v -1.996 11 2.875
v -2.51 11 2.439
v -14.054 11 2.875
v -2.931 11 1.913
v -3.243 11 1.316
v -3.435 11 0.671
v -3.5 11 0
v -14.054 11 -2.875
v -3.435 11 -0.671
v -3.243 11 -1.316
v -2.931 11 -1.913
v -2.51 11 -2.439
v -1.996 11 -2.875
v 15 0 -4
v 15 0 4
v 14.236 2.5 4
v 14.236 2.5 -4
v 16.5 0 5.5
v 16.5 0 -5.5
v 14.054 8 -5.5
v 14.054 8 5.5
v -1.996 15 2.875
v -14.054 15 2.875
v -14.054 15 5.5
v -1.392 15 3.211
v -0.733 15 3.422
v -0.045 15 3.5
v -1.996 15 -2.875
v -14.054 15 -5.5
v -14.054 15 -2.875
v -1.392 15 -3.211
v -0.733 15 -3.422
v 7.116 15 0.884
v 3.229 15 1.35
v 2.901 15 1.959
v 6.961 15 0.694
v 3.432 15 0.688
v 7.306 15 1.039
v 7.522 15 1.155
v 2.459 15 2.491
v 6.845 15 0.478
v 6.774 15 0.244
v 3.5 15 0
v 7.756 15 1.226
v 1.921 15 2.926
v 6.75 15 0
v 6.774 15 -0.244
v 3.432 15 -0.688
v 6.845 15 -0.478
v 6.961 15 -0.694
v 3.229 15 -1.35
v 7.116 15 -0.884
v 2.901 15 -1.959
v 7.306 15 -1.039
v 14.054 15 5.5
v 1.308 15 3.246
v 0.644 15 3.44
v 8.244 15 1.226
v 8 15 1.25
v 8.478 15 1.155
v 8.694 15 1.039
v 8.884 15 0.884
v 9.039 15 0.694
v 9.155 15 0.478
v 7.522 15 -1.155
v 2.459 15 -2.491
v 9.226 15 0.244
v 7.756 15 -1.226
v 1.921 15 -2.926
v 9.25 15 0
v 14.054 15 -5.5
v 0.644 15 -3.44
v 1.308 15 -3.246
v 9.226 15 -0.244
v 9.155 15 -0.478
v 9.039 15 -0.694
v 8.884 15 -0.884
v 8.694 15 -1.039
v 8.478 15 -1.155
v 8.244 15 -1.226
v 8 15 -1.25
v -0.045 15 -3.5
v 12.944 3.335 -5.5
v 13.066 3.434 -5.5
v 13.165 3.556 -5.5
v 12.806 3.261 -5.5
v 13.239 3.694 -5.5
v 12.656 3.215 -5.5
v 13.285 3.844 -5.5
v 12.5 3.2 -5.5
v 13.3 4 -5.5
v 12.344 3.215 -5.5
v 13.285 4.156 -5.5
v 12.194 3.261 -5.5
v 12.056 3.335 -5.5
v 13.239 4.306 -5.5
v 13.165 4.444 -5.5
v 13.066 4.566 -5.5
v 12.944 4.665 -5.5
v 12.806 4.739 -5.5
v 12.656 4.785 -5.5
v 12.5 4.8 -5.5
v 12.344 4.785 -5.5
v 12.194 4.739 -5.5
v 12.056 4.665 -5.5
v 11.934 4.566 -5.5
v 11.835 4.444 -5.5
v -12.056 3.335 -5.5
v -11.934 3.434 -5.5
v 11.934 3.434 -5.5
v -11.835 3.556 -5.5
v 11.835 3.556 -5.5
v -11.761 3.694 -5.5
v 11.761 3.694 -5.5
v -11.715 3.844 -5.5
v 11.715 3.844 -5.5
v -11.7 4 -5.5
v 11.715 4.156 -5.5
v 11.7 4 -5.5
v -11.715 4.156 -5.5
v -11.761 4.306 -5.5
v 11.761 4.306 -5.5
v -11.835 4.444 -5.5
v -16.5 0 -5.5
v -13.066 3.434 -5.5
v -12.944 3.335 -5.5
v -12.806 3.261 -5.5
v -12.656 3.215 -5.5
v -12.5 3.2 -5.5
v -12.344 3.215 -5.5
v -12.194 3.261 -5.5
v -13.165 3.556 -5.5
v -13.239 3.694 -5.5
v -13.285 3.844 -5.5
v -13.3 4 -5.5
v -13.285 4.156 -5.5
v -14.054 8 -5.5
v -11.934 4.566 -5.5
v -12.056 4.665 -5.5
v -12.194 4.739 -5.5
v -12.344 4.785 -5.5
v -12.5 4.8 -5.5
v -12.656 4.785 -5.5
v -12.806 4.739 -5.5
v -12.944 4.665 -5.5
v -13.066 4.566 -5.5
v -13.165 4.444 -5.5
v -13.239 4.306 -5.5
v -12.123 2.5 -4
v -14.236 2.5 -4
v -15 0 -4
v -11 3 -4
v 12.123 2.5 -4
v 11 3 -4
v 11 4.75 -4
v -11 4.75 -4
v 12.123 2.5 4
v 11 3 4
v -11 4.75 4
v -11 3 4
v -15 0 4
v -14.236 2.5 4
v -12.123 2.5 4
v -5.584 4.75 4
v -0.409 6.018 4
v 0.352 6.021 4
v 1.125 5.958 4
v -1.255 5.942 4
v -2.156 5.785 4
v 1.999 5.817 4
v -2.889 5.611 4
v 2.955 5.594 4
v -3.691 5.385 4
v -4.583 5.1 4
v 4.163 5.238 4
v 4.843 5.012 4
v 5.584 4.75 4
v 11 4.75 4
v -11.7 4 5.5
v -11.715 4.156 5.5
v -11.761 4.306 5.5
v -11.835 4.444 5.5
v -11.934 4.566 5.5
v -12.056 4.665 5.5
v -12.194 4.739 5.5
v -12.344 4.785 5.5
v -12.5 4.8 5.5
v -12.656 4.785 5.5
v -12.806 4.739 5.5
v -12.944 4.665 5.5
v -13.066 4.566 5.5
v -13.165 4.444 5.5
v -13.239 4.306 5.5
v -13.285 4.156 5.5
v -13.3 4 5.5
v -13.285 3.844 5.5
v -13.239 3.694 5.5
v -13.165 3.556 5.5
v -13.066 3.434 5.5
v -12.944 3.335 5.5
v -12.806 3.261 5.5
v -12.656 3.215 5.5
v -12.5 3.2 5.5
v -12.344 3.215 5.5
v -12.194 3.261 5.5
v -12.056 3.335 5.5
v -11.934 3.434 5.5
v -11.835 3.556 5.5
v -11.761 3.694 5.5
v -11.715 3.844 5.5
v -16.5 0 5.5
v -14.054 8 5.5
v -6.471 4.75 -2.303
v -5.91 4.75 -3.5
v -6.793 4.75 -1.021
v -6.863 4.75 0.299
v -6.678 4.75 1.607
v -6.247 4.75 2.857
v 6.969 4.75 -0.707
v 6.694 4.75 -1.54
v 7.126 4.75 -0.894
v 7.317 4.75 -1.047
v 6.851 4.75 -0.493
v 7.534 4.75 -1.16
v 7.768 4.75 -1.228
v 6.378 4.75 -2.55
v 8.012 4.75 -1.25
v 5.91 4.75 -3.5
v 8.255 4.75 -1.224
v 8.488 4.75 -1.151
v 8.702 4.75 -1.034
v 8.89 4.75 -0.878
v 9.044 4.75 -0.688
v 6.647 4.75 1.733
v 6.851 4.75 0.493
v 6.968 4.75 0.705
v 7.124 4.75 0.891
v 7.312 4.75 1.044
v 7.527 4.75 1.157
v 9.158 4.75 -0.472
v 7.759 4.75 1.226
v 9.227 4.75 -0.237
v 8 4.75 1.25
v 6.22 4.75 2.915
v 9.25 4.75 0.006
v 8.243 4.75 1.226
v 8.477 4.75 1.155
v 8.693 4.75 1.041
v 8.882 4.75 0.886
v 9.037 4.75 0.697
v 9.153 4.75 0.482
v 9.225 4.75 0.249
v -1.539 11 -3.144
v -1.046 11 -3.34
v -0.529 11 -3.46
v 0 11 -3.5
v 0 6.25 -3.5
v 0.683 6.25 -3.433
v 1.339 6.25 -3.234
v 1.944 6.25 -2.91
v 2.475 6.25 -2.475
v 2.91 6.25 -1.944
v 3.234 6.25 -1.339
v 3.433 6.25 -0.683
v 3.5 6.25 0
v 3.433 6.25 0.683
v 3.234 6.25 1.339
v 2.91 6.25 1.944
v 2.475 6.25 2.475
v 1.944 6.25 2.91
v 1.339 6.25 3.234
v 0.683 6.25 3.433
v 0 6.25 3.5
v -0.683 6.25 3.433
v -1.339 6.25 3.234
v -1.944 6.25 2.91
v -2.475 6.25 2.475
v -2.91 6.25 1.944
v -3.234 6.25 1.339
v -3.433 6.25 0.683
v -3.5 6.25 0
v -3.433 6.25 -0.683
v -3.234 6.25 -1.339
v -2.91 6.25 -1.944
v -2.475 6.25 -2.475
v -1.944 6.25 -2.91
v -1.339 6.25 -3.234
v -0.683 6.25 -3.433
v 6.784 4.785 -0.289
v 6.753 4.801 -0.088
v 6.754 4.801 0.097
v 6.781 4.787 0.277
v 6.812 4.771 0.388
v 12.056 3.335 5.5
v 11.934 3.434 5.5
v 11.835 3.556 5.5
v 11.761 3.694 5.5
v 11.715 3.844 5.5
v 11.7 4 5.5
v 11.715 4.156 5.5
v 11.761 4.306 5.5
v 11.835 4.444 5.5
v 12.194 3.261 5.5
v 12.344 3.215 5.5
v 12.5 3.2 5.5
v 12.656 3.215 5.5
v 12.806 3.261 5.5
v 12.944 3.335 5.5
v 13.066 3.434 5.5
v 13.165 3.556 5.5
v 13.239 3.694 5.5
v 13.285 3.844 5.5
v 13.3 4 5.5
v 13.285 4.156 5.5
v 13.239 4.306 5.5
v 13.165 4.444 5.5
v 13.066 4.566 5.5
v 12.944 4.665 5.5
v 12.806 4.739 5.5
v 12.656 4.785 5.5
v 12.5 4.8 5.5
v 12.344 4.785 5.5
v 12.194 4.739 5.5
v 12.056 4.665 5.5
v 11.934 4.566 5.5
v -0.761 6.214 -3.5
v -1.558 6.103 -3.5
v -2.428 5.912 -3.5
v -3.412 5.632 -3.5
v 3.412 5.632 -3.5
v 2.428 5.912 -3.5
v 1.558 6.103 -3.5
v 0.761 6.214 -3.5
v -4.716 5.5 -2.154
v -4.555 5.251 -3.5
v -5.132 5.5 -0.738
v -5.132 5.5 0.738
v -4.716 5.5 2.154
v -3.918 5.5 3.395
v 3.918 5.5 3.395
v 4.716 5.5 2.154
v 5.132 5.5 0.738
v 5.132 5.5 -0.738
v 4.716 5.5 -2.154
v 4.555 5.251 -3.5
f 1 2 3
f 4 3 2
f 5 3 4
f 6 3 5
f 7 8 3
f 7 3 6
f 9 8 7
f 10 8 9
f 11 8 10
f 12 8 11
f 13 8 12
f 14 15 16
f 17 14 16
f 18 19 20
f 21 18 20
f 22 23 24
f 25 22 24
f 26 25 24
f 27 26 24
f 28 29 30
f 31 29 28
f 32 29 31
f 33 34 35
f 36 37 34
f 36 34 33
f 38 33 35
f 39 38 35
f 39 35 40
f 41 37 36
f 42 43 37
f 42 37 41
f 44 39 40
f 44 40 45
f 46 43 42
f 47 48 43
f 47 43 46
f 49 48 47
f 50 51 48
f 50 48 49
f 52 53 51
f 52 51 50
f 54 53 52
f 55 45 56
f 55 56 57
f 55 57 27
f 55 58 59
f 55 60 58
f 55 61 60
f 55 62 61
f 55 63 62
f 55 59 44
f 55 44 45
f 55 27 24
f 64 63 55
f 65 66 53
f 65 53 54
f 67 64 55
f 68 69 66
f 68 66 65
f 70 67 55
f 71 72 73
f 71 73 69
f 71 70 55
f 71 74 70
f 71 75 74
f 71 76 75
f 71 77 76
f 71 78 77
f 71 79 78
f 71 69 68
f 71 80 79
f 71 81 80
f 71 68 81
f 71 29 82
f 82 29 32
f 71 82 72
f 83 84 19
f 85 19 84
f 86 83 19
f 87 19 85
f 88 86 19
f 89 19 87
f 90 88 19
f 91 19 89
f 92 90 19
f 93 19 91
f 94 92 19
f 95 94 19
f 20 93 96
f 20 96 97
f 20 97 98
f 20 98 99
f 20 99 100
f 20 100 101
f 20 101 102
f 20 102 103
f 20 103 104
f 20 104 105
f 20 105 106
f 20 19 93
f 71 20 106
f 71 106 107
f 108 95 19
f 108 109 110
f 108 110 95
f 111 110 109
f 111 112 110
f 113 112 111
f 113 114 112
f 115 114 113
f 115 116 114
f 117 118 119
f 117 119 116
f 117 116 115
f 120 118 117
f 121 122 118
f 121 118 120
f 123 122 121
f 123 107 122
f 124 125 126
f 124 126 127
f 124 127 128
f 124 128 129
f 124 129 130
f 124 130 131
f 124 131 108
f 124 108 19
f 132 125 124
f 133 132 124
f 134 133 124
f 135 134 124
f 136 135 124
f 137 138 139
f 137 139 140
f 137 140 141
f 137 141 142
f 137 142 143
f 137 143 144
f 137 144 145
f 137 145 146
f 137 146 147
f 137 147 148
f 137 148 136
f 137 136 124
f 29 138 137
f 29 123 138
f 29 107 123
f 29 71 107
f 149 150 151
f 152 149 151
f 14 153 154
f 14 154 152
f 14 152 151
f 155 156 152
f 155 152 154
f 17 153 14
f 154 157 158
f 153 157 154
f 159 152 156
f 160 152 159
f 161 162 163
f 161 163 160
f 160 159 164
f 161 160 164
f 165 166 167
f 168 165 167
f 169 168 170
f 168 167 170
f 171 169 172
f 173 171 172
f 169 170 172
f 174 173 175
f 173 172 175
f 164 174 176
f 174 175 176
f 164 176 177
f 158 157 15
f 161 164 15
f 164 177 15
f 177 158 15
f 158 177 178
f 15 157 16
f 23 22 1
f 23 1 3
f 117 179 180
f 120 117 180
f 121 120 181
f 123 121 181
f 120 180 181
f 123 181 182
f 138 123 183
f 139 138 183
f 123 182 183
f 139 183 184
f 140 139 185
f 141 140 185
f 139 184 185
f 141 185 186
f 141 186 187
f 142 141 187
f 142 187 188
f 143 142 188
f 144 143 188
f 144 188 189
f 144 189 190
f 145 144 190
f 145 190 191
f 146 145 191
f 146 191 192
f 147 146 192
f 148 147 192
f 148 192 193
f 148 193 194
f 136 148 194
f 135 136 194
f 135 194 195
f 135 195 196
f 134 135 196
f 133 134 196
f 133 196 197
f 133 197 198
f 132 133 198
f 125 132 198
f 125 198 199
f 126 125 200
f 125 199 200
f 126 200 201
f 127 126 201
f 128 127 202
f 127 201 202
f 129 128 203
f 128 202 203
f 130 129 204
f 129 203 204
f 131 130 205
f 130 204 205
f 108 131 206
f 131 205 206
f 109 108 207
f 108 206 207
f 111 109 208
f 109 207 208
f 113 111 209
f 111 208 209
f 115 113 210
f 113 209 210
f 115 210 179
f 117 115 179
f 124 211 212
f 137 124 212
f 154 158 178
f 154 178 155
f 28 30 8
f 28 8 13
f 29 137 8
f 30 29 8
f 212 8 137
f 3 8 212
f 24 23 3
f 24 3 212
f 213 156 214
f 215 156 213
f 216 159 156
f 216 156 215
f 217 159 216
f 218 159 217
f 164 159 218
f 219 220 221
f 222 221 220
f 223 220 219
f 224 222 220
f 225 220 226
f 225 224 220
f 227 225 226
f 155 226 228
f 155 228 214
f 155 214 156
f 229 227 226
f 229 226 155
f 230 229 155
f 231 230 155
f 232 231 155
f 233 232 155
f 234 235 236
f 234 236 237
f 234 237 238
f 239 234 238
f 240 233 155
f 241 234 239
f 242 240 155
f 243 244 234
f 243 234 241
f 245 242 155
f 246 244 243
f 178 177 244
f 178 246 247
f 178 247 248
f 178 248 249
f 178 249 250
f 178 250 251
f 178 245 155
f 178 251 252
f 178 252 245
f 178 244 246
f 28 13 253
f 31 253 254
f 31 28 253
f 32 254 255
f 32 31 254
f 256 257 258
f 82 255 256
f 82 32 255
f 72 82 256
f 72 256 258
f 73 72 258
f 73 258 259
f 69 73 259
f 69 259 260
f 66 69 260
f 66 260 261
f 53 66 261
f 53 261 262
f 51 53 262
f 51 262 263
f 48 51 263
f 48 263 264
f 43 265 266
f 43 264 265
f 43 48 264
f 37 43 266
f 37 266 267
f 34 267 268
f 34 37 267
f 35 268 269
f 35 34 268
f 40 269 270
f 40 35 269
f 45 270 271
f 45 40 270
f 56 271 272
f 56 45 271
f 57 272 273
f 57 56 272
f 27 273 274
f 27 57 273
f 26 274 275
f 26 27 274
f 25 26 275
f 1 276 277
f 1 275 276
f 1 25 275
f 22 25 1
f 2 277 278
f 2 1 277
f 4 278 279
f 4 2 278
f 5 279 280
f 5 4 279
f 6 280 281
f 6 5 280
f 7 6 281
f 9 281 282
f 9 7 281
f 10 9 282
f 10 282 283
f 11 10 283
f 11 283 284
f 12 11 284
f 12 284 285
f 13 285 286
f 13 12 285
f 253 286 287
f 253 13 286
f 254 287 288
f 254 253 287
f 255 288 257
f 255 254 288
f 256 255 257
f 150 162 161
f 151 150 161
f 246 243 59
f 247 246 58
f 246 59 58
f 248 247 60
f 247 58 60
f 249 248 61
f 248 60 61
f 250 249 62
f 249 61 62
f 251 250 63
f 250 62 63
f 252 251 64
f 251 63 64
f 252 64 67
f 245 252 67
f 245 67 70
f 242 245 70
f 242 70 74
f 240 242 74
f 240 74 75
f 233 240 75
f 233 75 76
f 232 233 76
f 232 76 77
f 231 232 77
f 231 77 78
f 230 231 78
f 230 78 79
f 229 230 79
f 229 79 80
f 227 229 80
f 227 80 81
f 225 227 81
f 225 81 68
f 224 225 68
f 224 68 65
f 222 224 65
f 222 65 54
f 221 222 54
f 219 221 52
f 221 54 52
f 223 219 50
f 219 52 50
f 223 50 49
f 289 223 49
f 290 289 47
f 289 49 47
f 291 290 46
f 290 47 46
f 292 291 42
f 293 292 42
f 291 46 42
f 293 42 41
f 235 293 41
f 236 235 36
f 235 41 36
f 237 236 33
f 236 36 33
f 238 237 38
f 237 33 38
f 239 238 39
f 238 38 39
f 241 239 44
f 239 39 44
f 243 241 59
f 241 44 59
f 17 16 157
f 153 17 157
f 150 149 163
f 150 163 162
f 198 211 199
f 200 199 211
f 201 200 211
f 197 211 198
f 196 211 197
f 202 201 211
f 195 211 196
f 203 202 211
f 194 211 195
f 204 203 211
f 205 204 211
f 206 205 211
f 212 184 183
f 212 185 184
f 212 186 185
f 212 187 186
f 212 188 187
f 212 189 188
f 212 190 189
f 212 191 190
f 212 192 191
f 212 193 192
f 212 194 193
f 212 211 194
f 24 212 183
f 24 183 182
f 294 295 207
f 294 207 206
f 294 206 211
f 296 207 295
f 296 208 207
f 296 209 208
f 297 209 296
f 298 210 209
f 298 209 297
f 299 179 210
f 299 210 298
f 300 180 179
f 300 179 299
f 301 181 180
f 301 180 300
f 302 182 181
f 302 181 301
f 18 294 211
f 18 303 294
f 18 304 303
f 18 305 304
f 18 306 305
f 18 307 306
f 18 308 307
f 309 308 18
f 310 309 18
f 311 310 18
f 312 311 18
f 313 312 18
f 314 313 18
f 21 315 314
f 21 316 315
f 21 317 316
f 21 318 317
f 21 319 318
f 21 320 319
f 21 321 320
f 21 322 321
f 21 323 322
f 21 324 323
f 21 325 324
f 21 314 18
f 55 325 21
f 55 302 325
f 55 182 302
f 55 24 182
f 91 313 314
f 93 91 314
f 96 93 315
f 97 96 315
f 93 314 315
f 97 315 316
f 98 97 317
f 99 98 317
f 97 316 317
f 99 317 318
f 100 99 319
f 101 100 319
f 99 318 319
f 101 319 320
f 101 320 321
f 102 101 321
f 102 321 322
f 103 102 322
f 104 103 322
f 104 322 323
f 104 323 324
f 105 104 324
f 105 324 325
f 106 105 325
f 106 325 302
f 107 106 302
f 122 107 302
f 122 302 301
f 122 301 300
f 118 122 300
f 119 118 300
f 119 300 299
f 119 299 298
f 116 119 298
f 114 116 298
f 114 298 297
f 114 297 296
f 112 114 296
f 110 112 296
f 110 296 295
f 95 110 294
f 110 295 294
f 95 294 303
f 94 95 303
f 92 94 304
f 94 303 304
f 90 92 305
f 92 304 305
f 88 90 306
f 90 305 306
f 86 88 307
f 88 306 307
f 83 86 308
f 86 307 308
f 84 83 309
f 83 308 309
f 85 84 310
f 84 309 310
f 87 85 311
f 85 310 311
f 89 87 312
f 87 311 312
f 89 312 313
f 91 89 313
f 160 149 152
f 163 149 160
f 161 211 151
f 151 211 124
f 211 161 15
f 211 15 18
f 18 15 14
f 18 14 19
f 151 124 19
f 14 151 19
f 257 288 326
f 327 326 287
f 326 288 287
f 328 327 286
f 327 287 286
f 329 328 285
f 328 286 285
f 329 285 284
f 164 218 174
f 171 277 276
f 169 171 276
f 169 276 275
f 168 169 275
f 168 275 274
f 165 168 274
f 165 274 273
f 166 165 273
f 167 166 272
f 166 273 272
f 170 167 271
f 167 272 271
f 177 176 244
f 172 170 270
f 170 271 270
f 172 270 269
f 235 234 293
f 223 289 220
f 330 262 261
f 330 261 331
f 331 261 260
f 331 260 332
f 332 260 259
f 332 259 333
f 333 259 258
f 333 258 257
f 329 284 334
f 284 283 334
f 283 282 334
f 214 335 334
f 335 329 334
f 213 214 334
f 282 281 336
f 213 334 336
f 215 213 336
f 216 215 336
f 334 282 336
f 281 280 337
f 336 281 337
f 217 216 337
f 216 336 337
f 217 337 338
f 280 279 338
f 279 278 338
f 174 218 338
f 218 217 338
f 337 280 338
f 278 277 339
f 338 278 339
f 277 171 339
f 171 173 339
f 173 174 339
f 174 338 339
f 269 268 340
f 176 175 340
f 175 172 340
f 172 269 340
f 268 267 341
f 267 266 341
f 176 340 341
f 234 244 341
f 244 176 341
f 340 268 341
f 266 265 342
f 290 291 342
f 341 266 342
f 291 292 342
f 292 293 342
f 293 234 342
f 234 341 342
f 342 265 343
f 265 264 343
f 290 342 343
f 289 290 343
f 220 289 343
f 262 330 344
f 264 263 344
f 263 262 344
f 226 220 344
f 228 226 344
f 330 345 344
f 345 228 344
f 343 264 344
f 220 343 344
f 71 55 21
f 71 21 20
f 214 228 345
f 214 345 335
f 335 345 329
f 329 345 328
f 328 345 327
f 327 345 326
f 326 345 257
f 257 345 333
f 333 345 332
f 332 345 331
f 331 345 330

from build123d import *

# Parameters (mm, degrees)
SKETCH1_W                      = 33
SKETCH1_H                      = 11
SKETCH1_W_2                    = 30.000000000000036
SKETCH1_H_2                    = 7.99999999999994
BOSS_EXTRUDE1_DEPTH            = 8
SKETCH3_R                      = 0.8000000000000009
CUT_EXTRUDE3_DEPTH             = 22.383404780343106
CUT_EXTRUDE5_REACH             = 21.144
SKETCH5_R                      = 3.5
CUT_EXTRUDE5_DIRECTION_2_DEPTH = 20.144189719076667
CUT_EXTRUDE4_DEPTH             = 22.383404780343106
CUT_EXTRUDE9_START             = -1.5
CUT_EXTRUDE9_DEPTH             = 8
CUT_EXTRUDE8_DEPTH             = 2.25
BOSS_EXTRUDE8_START            = 3
SKETCH12_W                     = 28.108309096661426
SKETCH12_H                     = 11
SKETCH12_R                     = 3.5
BOSS_EXTRUDE8_DEPTH            = 3
CHAMFER1_SIZE                  = 3.369055161
CHAMFER1_SIZE_2                = 1.5
CHAMFER2_SIZE                  = 0.5
CHAMFER2_SIZE2                 = 1.1230183869521158
CHAMFER3_SIZE                  = 0.5
CHAMFER3_SIZE2                 = 1.1230183869521158
BOSS_EXTRUDE9_REACH            = 20.481
BOSS_EXTRUDE10_START           = 4
BOSS_EXTRUDE10_DEPTH           = 4
CUT_EXTRUDE10_REACH            = 24.967
SKETCH20_R                     = 1.2499999999999991


with BuildPart() as part:
    # Sketch1 → Boss-Extrude1 (new body)
    # profile 1 of 2: a face of its own
    with BuildSketch(Plane(origin=(0, 0, 0), x_dir=(1, 0, 0), z_dir=(0, 1, 0))):
        Rectangle(SKETCH1_W, SKETCH1_H)
        Rectangle(SKETCH1_W_2, SKETCH1_H_2, mode=Mode.SUBTRACT)
    # profile 2 of 2: a face of its own
    with BuildSketch(Plane(origin=(0, 0, 0), x_dir=(1, 0, 0), z_dir=(0, 1, 0))):
        Rectangle(SKETCH1_W_2, SKETCH1_H_2)
    extrude(amount=BOSS_EXTRUDE1_DEPTH)

    # Sketch3 → Cut-Extrude3 (cut, through all)
    with BuildSketch(Plane.XY.offset(5.50000000000003)):
        with Locations((-12.500000000000014, 4)):
            Circle(SKETCH3_R)
        with Locations((12.499999999999988, 4)):
            Circle(SKETCH3_R)
    extrude(amount=-CUT_EXTRUDE3_DEPTH, mode=Mode.SUBTRACT)

    # Sketch5 → Cut-Extrude5 (cut, up to next)
    with BuildSketch(Plane(origin=(0, 8, 0), x_dir=(1, 0, 0), z_dir=(0, 1, 0)), mode=Mode.PRIVATE) as cut_extrude5_sk1:
        with Locations(Location((0, 0, 0), (0, 0, 90))):
            Circle(SKETCH5_R)
    cut_extrude5_tool1 = extrude(cut_extrude5_sk1.sketch, amount=-CUT_EXTRUDE5_REACH, mode=Mode.PRIVATE) & part.part
    add(cut_extrude5_tool1.solids().sort_by_distance((0, 8, 0))[0], mode=Mode.SUBTRACT)

    # Sketch5 → Cut-Extrude5 direction 2 (cut)
    with BuildSketch(Plane(origin=(0, 8, 0), x_dir=(1, 0, 0), z_dir=(0, 1, 0))):
        with Locations(Location((0, 0, 0), (0, 0, 90))):
            Circle(SKETCH5_R)
    extrude(amount=CUT_EXTRUDE5_DIRECTION_2_DEPTH, mode=Mode.SUBTRACT)

    # Sketch4 → Cut-Extrude4 (cut, through all)
    with BuildSketch(Plane.XY.offset(5.50000000000003)):
        Polygon((-16.500000000000014, 0), (-14.054154548330727, 8), (-16.500000000000014, 8), align=None)
        Polygon((16.499999999999986, 0), (14.0541545483307, 8), (16.499999999999986, 8), align=None)
    extrude(amount=-CUT_EXTRUDE4_DEPTH, mode=Mode.SUBTRACT)

    # Sketch14 → Cut-Extrude9 (cut)
    with BuildSketch(Plane.XY.offset(5.50000000000003).offset(CUT_EXTRUDE9_START)):
        Polygon((-15.000000000000014, 0), (14.999999999999988, 0), (14.23567329635332, 2.5000000000000067), (-14.235673296353353, 2.500000000000003), align=None)
    extrude(amount=-CUT_EXTRUDE9_DEPTH, mode=Mode.SUBTRACT)

    # Sketch9 → Cut-Extrude8 (cut)
    with BuildSketch(Plane.XZ.offset(-2.500000000000005)):
        Polygon((-11.000000000000002, 4.000000000000002), (11.000000000000002, 4.000000000000001), (11.000000000000004, -3.999999999999999), (-11, -4.000000000000002), align=None)
    extrude(amount=-CUT_EXTRUDE8_DEPTH, mode=Mode.SUBTRACT)

    # Sketch12 → Boss-Extrude8 (add)
    with BuildSketch(Plane(origin=(0, 8, 0), x_dir=(1, 0, 0), z_dir=(0, 1, 0)).offset(BOSS_EXTRUDE8_START)):
        Rectangle(SKETCH12_W, SKETCH12_H)
        with Locations(Location((0, 0, 0), (0, 0, 90))):
            Circle(SKETCH12_R, mode=Mode.SUBTRACT)
    extrude(amount=-BOSS_EXTRUDE8_DEPTH)

    # Chamfer1
    # the kernel refuses this chamfer: 3.369055161, 1.5 mm, written as the material it takes off along each edge
    with BuildSketch(Plane(origin=(0, 4.750000000000005, 0), x_dir=(6e-17, 0, -1), z_dir=(1, 0, 6e-17))) as chamfer1_piece_1_section:
        Polygon((3.5 + CHAMFER1_SIZE, 0), (3.5, CHAMFER1_SIZE_2), (3.5, 0), align=None)
    chamfer1_piece_1 = revolve(axis=Axis((0, 4.750000000000005, 0), (0, 1, 0)), mode=Mode.PRIVATE)
    chamfer1_piece_1 = split(chamfer1_piece_1, bisect_by=Plane(origin=(-5.449382074907194, 4.96599151817854, 4.00000000000003), z_dir=(0, 0, -1)), keep=Keep.TOP, mode=Mode.PRIVATE)
    chamfer1_piece_1 = split(chamfer1_piece_1, bisect_by=Plane(origin=(-5.449382074907194, 4.96599151817854, -3.99999999999997), z_dir=(0, 0, 1)), keep=Keep.TOP, mode=Mode.PRIVATE)
    add(chamfer1_piece_1, mode=Mode.SUBTRACT)

    # Chamfer2
    chamfer2_edges = [part.edges().sort_by_distance(p)[0] for p in [
        (-11, 2.5000000000000036, 0),
    ]]
    chamfer2_side = [part.faces().sort_by_distance(p)[0] for p in [
        (-11.000000000000002, 3.625000000000003, 0),
    ]]
    chamfer(chamfer2_edges, length=CHAMFER2_SIZE, length2=CHAMFER2_SIZE2, reference=chamfer2_side[0])

    # Chamfer3
    chamfer3_edges = [part.edges().sort_by_distance(p)[0] for p in [
        (11.000000000000004, 2.500000000000006, 8.9e-16),
    ]]
    chamfer3_side = [part.faces().sort_by_distance(p)[0] for p in [
        (11.000000000000002, 3.625000000000006, 7.9e-16),
    ]]
    chamfer(chamfer3_edges, length=CHAMFER3_SIZE, length2=CHAMFER3_SIZE2, reference=chamfer3_side[0])

    # Sketch17 → Boss-Extrude9 (add, up to next)
    with BuildSketch(Plane.XZ.offset(-4.750000000000004), mode=Mode.PRIVATE) as boss_extrude9_sk1:
        Polygon((5.910492264007006, -3.500000000000001), (8.9e-16, -3.5), (-5.910492264007006, -3.500000000000001), (-5.910492264007006, -3.999999999999969), (5.910492264007006, -3.999999999999969), align=None)
    boss_extrude9_tool1 = extrude(boss_extrude9_sk1.sketch, amount=-BOSS_EXTRUDE9_REACH, mode=Mode.PRIVATE) - part.part
    add(boss_extrude9_tool1.solids().sort_by_distance((0, 4.75, -3.75))[0])

    # Sketch18 → Boss-Extrude10 (add)
    with BuildSketch(Plane(origin=(0, 11, 0), x_dir=(1, 0, 0), z_dir=(0, 1, 0)).offset(BOSS_EXTRUDE10_START)):
        with BuildLine():
            Line((-1.9960899278338715, -2.875000000000029), (-14.054154548330727, -2.875000000000029))
            Line((-14.054154548330727, -2.875000000000029), (-14.054154548330727, -5.50000000000003))
            Line((-14.054154548330729, -5.50000000000003), (14.0541545483307, -5.50000000000003))
            Line((14.0541545483307, -5.50000000000003), (14.0541545483307, -2.875000000000029))
            Line((14.054154548330702, -2.875000000000029), (1.9960899278337951, -2.875000000000029))
            ThreePointArc((1.996089927833807, -2.8750000000000746), (-3.947e-14, -3.5), (-1.9960899278338722, -2.8750000000000293))
        make_face()
        with BuildLine():
            Line((14.0541545483307, 5.499999999999971), (-14.054154548330729, 5.499999999999971))
            Line((-14.054154548330727, 5.499999999999971), (-14.054154548330727, 2.8749999999999707))
            Line((-14.054154548330727, 2.8749999999999707), (-1.9960899278339532, 2.8749999999999707))
            ThreePointArc((-1.996089927833954, 2.8749999999999725), (-4.946e-14, 3.5), (1.9960899278338722, 2.875000000000029))
            Line((1.9960899278338768, 2.8749999999999702), (14.054154548330702, 2.8749999999999702))
            Line((14.0541545483307, 2.8749999999999702), (14.0541545483307, 5.499999999999971))
        make_face()
        with BuildLine():
            Line((14.0541545483307, -2.875000000000029), (14.0541545483307, 2.87499999999997))
            Line((14.054154548330702, 2.8749999999999702), (1.9960899278338768, 2.8749999999999702))
            ThreePointArc((1.9960899278338722, 2.875000000000029), (3.1013154263488385, 1.6222954805739687), (3.5000000000000004, 0))
            ThreePointArc((3.5000000000000004, 0), (3.10131542634882, -1.622295480574004), (1.996089927833807, -2.8750000000000746))
            Line((1.9960899278337951, -2.875000000000029), (14.054154548330702, -2.875000000000029))
        make_face()
    extrude(amount=-BOSS_EXTRUDE10_DEPTH)

    # Sketch20 → Cut-Extrude10 (cut, up to next)
    with BuildSketch(Plane(origin=(0, 15, 0), x_dir=(1, 0, 0), z_dir=(0, 1, 0)), mode=Mode.PRIVATE) as cut_extrude10_sk1:
        with Locations(Location((8, 0, 0), (0, 0, 270))):
            Circle(SKETCH20_R)
    cut_extrude10_tool1 = extrude(cut_extrude10_sk1.sketch, amount=-CUT_EXTRUDE10_REACH, mode=Mode.PRIVATE) & part.part
    add(cut_extrude10_tool1.solids().sort_by_distance((8, 15, 0))[0], mode=Mode.SUBTRACT)


solid = part.part
